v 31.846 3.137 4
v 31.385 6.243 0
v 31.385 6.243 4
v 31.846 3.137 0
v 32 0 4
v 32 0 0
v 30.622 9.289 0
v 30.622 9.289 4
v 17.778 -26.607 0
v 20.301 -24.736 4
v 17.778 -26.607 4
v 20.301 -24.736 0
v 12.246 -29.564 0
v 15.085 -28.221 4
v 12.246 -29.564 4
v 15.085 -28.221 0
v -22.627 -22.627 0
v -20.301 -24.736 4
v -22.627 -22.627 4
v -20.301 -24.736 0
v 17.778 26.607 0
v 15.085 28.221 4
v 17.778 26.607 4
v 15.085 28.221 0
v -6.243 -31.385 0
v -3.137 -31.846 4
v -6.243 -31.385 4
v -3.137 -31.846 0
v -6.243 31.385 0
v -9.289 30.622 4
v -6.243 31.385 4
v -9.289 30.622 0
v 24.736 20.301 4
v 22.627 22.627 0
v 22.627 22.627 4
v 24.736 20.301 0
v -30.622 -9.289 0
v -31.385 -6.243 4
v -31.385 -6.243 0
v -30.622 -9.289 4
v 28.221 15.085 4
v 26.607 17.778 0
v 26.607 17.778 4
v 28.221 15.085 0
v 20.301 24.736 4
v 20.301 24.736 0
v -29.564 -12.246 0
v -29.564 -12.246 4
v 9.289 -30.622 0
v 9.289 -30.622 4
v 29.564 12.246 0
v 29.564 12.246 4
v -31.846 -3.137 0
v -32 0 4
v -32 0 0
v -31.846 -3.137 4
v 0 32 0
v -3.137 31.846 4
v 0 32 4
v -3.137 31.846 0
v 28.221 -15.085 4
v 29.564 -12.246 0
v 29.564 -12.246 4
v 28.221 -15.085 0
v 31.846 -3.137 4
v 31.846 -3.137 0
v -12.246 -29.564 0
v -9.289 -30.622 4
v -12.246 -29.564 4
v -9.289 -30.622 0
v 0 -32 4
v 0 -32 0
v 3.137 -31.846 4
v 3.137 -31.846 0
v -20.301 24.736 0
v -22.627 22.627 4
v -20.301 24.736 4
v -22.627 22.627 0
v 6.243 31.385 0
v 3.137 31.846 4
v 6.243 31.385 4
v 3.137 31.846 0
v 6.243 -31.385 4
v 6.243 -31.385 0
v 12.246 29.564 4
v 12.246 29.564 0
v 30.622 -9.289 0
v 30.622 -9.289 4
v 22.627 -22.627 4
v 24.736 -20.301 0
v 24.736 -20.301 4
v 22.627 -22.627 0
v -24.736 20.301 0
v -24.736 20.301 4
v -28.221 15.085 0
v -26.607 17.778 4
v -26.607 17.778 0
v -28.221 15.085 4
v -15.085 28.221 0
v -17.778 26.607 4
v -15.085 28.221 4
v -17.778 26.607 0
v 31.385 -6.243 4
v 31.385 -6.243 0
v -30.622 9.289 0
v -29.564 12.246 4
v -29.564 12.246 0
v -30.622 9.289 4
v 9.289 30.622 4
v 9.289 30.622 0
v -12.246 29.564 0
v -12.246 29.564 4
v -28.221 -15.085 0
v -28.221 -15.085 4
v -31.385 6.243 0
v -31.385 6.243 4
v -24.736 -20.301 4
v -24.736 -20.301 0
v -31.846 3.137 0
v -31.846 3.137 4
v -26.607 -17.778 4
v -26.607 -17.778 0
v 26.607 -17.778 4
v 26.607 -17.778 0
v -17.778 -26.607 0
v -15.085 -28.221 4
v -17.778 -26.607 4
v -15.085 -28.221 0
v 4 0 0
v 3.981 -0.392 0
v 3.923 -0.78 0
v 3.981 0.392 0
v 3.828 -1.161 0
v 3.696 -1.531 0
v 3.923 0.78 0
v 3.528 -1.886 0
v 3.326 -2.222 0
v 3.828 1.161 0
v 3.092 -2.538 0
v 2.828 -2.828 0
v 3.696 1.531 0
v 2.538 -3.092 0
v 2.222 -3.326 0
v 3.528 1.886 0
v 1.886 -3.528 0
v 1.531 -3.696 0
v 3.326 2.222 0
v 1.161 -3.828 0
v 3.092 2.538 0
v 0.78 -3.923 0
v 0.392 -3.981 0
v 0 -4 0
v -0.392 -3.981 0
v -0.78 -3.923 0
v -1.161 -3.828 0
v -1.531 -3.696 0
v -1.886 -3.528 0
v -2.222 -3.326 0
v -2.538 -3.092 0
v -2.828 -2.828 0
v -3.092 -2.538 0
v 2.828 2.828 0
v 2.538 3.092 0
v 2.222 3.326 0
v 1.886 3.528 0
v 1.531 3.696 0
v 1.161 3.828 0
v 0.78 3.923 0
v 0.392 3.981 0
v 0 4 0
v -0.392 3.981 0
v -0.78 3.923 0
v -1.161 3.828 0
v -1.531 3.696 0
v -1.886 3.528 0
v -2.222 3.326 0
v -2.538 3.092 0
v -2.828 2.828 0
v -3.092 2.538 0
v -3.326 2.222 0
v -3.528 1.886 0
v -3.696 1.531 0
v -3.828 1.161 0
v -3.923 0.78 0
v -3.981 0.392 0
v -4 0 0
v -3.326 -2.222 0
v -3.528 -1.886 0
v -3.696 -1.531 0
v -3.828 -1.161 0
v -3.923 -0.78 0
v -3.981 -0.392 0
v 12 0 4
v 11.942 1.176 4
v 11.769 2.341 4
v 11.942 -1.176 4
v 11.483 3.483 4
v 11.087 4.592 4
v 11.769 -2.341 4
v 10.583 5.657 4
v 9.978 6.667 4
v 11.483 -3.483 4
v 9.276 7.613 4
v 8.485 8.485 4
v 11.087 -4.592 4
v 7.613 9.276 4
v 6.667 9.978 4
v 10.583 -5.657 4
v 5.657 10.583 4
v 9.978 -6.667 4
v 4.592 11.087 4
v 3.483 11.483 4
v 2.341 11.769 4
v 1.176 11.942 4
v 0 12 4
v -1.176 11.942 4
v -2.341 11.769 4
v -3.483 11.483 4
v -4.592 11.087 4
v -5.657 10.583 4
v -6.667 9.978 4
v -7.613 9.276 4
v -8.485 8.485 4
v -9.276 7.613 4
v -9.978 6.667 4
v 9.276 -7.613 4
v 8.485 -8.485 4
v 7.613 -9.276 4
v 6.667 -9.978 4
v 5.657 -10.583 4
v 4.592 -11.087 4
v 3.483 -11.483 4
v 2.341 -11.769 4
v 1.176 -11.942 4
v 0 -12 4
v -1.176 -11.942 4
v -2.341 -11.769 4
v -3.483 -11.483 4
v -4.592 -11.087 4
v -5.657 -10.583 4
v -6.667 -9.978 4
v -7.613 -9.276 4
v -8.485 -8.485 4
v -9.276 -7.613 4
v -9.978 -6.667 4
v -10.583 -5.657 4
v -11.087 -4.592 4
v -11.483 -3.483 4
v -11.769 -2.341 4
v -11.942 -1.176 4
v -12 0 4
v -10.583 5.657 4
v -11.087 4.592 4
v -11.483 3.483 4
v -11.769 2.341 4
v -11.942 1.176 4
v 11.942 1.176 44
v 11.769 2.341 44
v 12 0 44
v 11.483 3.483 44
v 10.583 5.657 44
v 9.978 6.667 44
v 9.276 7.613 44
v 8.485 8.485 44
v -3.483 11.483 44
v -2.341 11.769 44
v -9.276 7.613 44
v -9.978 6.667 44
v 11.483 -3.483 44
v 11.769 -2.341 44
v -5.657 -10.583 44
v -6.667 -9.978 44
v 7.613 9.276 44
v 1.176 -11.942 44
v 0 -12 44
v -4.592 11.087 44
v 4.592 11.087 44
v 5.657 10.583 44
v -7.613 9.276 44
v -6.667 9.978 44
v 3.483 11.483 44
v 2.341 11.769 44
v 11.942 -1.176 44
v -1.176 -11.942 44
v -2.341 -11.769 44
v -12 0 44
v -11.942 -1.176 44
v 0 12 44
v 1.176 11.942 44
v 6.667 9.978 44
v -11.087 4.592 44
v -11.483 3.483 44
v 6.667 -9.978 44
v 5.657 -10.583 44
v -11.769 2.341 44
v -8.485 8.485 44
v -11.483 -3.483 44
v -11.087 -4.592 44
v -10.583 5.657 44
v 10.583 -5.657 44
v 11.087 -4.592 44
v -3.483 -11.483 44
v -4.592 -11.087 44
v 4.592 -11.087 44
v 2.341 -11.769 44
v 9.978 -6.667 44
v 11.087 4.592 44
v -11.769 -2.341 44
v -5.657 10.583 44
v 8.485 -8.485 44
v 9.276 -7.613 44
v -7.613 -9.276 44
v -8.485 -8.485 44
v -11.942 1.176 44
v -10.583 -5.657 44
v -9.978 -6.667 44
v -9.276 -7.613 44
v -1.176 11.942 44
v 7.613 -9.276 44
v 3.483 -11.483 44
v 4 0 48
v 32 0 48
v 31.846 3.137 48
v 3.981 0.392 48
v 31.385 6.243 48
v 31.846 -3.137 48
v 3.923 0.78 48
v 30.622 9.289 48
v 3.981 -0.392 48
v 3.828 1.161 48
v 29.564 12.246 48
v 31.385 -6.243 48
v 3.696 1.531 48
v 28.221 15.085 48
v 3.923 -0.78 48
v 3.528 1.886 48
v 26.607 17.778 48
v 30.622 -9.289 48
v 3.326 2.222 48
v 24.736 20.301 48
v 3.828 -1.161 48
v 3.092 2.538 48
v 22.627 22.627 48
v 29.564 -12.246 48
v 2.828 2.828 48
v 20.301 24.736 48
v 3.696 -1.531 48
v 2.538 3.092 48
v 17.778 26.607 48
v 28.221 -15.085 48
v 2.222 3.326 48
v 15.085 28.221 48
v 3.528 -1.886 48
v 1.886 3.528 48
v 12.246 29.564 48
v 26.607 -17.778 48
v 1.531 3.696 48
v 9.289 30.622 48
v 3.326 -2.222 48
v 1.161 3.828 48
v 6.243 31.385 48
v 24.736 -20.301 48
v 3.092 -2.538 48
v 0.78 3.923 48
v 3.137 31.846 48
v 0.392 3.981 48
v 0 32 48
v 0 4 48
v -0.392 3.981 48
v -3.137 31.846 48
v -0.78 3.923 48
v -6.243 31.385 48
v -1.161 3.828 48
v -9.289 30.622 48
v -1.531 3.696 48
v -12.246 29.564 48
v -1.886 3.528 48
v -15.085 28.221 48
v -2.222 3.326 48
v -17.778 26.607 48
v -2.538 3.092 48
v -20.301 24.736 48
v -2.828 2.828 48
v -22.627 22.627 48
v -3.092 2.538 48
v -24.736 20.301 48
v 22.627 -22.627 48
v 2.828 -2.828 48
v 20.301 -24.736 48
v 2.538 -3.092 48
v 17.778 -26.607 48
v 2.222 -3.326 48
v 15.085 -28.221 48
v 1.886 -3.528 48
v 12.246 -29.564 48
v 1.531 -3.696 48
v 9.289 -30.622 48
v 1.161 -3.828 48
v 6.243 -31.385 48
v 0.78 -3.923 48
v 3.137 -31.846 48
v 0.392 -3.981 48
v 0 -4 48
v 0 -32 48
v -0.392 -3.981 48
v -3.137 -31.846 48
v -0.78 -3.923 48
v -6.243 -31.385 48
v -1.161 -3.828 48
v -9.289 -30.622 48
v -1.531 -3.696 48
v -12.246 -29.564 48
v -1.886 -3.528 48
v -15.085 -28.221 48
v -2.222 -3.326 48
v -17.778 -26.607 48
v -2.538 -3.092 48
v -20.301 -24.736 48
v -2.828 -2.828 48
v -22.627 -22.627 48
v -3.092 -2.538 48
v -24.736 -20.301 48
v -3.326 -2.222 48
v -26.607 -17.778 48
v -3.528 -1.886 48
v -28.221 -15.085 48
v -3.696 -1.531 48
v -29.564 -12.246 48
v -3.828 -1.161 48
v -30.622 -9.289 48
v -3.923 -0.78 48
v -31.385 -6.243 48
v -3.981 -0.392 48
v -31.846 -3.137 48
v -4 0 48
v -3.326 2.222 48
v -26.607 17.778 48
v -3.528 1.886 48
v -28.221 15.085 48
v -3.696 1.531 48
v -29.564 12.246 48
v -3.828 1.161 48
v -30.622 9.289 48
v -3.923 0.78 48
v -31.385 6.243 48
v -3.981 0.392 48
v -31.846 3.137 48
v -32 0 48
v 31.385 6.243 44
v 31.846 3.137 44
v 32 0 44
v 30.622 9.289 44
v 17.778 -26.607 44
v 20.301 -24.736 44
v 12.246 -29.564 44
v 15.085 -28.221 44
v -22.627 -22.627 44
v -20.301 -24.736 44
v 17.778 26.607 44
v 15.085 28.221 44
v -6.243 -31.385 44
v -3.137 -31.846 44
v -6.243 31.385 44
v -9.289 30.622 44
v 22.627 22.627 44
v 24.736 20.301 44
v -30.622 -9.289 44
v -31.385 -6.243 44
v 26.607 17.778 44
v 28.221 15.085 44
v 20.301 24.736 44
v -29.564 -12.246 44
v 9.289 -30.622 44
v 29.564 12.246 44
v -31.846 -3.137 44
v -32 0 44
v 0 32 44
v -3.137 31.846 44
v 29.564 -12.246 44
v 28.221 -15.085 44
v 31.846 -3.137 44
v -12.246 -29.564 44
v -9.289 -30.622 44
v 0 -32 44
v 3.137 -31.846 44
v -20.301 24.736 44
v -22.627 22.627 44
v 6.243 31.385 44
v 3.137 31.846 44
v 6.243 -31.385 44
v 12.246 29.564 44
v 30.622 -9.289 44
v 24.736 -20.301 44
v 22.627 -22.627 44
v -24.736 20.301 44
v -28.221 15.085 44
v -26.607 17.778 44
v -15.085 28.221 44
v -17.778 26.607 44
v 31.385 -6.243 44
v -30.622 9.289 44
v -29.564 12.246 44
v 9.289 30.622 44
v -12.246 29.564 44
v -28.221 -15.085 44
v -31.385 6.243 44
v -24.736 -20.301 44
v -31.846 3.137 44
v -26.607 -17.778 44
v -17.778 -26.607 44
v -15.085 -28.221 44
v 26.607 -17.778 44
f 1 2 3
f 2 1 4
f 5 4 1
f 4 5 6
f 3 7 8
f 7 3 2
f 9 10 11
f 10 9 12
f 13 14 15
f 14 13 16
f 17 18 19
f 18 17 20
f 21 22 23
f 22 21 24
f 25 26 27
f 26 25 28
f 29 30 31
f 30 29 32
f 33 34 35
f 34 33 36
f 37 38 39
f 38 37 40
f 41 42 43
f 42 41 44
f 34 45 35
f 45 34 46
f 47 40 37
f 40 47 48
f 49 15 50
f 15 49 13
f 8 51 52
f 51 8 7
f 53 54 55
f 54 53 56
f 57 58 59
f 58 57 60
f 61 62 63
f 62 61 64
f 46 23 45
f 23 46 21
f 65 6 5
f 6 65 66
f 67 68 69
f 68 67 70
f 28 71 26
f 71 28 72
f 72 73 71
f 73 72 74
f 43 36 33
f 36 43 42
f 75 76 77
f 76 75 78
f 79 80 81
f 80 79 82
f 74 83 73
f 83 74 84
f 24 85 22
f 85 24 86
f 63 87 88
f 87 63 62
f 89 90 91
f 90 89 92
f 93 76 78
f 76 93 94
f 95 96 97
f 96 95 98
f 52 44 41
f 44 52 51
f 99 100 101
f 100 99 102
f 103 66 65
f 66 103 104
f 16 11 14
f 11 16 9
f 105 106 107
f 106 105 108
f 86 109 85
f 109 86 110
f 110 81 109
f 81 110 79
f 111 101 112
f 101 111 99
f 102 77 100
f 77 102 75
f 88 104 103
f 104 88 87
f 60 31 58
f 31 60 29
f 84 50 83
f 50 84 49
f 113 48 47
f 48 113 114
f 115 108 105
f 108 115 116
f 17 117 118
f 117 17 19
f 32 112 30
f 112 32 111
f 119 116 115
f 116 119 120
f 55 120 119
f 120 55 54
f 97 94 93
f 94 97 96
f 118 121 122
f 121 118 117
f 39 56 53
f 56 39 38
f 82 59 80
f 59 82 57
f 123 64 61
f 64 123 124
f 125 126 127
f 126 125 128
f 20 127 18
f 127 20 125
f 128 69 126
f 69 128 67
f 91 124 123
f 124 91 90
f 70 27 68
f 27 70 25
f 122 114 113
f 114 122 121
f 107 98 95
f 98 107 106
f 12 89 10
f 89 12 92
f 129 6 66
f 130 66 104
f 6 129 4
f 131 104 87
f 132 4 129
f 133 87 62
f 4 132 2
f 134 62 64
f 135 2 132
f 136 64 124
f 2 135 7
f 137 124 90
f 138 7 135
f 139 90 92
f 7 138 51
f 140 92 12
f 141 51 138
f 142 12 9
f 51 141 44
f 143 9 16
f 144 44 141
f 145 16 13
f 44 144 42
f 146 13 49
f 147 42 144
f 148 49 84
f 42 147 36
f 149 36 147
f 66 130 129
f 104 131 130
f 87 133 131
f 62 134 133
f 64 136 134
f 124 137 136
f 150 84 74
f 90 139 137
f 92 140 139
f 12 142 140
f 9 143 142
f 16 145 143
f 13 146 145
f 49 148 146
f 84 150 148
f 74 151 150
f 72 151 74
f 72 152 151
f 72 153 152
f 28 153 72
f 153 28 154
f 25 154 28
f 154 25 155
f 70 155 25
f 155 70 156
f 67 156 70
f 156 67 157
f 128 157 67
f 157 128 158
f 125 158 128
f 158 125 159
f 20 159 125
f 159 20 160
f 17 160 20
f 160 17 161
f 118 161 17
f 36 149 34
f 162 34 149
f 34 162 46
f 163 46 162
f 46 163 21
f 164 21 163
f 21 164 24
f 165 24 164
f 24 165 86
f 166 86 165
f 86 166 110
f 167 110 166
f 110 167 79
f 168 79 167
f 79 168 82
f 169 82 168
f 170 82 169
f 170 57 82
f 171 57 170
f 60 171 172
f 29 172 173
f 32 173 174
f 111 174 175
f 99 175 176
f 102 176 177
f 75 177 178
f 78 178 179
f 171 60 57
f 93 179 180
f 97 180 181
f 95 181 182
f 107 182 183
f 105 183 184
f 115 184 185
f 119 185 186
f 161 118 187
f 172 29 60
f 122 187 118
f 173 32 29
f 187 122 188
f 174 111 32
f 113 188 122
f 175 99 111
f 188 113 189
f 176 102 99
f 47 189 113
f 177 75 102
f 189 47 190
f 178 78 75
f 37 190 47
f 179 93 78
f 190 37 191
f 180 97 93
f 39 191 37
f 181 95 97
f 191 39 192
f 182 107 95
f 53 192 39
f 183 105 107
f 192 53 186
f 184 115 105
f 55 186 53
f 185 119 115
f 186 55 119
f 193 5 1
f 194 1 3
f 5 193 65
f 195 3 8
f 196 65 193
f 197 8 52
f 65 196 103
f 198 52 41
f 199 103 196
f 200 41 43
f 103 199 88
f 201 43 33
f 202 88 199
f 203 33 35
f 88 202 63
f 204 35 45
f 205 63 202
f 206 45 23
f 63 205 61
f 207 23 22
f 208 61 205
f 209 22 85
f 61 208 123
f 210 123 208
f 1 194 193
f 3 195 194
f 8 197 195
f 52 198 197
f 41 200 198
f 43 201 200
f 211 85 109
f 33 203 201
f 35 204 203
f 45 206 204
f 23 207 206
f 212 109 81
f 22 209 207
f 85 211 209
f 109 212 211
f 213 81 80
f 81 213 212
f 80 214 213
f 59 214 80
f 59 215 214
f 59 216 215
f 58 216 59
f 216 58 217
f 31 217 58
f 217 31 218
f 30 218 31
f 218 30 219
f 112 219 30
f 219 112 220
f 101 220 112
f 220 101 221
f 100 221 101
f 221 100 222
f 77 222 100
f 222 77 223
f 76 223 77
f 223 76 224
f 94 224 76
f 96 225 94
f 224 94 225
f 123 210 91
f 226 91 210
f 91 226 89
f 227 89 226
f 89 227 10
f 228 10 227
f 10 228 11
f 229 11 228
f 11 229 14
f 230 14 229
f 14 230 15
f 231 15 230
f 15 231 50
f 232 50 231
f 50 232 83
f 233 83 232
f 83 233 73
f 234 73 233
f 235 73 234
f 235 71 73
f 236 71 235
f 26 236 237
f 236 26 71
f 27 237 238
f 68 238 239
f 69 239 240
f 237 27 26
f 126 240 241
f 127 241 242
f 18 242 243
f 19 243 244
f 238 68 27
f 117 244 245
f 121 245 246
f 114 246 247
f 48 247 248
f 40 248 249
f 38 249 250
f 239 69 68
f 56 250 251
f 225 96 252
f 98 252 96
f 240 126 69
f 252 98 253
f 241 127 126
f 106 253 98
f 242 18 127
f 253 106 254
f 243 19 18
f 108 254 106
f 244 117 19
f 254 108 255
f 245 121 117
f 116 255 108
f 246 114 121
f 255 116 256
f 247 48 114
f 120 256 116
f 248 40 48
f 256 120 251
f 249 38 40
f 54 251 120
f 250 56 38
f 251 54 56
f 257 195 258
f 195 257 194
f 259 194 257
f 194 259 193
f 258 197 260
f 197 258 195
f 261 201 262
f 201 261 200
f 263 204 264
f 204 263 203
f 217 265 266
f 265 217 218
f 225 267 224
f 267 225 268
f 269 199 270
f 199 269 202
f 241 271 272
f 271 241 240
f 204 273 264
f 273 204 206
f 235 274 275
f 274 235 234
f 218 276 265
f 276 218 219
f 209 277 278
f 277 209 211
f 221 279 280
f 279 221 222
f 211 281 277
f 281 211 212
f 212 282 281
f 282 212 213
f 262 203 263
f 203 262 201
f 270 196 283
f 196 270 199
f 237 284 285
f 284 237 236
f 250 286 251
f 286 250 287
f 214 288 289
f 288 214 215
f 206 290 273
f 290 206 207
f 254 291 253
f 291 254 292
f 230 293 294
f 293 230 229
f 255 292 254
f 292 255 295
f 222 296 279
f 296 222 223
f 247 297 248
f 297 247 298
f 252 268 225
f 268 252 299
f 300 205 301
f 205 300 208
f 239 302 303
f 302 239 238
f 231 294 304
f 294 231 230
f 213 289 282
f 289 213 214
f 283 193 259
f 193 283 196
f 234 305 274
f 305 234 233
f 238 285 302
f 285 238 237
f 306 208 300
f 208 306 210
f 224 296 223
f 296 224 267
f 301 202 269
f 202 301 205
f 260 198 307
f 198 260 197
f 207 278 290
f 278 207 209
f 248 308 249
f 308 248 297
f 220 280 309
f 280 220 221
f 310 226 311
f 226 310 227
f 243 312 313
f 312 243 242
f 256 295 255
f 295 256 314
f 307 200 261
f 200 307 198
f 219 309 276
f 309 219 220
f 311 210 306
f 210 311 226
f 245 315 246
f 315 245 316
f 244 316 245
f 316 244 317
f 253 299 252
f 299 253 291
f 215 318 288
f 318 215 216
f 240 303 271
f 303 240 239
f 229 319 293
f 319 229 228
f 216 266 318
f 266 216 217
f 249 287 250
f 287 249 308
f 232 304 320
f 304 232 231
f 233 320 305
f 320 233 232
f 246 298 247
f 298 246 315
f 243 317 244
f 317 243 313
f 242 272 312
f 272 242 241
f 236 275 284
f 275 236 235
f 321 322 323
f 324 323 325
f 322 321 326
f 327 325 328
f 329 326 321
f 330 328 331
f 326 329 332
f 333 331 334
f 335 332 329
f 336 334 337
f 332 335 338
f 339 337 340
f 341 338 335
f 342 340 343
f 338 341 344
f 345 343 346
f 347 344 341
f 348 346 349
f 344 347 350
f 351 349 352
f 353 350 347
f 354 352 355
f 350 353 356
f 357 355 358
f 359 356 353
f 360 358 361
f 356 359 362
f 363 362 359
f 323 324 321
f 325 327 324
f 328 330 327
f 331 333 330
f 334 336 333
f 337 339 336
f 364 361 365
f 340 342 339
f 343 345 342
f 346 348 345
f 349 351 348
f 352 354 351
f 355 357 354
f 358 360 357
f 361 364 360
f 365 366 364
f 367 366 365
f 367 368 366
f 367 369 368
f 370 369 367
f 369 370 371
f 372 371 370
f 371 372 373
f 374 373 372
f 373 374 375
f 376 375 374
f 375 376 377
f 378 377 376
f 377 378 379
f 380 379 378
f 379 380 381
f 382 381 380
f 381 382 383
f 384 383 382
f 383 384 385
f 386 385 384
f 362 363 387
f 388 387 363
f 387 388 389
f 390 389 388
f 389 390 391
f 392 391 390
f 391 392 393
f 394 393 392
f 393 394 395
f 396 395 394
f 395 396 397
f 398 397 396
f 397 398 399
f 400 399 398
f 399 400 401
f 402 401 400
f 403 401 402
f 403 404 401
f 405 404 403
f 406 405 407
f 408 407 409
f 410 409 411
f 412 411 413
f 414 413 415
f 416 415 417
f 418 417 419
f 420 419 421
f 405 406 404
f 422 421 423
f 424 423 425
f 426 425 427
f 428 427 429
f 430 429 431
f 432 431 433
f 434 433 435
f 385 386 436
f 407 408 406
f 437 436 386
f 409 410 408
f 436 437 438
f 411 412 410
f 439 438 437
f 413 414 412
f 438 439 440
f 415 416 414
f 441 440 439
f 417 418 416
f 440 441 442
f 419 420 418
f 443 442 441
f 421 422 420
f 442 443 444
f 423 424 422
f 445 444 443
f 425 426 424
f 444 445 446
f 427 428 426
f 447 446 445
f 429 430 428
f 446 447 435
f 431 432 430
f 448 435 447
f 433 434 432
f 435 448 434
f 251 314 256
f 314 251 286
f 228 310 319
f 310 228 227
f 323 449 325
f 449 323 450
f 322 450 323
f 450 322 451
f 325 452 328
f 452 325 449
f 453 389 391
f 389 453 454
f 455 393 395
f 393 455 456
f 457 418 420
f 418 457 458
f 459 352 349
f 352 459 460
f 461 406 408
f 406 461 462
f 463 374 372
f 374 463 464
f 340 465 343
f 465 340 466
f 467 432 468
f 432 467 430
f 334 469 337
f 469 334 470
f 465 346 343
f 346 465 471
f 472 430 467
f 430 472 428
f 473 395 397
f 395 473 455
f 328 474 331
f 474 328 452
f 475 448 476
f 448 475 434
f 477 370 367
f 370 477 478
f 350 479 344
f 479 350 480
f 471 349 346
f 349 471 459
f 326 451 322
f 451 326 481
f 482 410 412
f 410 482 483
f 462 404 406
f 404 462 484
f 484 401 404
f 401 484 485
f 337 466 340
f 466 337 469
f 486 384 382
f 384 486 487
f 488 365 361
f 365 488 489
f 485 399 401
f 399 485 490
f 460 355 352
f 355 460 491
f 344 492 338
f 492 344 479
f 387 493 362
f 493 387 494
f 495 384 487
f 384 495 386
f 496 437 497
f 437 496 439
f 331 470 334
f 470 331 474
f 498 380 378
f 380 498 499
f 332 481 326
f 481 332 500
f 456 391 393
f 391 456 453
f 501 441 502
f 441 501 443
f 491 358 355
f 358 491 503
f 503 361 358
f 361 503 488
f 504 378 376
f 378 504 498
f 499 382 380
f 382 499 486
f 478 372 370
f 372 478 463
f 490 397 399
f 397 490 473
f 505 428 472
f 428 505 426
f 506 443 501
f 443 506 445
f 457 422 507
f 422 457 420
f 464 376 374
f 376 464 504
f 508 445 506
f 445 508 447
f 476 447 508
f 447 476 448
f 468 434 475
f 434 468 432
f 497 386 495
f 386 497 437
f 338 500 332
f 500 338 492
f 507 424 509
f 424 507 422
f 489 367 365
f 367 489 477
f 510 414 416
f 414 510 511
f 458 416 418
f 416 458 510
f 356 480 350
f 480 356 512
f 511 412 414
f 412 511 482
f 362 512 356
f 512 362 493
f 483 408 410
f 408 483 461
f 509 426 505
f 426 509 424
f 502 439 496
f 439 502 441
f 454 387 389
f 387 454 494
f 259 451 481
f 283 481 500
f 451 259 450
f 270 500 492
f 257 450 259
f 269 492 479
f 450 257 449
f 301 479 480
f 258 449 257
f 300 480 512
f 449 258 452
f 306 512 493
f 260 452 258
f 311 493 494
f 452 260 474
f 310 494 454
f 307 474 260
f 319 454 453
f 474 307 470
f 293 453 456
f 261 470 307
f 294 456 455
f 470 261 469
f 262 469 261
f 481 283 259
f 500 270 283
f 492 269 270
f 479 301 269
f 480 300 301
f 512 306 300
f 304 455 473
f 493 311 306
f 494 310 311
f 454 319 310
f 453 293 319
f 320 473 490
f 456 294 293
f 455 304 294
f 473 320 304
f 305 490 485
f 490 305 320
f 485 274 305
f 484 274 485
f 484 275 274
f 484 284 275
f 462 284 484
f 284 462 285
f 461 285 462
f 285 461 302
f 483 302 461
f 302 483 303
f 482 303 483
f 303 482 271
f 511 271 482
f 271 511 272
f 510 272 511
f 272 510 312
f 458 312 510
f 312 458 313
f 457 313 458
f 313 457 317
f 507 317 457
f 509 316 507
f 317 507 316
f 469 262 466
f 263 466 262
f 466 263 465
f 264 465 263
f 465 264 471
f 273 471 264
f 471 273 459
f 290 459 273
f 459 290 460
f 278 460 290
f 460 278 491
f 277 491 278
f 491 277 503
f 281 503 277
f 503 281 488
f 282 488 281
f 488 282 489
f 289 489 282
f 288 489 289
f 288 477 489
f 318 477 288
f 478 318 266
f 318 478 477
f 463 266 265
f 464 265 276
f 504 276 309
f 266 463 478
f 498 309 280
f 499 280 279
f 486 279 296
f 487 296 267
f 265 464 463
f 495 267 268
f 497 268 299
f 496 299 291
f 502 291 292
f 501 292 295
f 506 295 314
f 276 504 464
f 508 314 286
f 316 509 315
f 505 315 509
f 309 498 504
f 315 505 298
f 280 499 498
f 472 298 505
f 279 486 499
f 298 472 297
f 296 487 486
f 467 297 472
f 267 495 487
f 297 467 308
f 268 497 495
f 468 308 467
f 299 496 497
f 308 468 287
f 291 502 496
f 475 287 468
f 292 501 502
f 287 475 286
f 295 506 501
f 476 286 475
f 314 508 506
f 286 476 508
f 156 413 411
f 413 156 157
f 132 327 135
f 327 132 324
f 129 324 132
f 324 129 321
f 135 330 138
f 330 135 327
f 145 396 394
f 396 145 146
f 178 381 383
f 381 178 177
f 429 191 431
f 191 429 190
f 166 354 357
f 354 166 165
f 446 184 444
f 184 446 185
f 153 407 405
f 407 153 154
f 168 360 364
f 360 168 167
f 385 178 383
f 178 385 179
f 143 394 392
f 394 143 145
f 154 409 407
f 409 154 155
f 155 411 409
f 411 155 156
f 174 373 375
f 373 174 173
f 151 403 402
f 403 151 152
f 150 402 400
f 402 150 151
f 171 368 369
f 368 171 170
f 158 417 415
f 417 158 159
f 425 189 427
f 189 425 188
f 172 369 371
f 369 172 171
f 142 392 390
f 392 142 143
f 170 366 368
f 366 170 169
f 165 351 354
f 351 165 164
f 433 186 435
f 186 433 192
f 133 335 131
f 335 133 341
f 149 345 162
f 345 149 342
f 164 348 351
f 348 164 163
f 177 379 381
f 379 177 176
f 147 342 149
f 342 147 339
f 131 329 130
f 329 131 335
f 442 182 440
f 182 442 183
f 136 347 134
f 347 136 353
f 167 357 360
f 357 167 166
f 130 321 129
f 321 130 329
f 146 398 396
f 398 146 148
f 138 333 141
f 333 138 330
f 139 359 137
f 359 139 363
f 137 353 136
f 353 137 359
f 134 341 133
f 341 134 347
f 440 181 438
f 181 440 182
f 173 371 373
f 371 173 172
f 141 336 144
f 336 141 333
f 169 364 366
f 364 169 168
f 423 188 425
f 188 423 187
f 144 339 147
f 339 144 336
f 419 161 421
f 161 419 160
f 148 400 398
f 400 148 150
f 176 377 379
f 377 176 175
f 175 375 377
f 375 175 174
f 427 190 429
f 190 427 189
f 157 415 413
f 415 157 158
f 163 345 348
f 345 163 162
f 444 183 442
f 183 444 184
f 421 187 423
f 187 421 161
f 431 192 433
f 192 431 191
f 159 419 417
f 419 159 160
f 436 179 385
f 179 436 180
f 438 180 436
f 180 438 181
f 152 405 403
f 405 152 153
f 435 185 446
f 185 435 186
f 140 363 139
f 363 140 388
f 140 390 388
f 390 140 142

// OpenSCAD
// Generated with SolidPython2 for OpenSCAD task-022
$fn = 64;

difference() {
	union() {
		translate(v = [0, 0, 0]) {
			cylinder(h = 4, r = 32.0);
		}
		translate(v = [0, 0, 0]) {
			cylinder(h = 48, r = 12.0);
		}
		translate(v = [0, 0, 44]) {
			cylinder(h = 4, r = 32.0);
		}
	}
	translate(v = [0, 0, -1]) {
		cylinder(h = 50, r = 4.0);
	}
}
